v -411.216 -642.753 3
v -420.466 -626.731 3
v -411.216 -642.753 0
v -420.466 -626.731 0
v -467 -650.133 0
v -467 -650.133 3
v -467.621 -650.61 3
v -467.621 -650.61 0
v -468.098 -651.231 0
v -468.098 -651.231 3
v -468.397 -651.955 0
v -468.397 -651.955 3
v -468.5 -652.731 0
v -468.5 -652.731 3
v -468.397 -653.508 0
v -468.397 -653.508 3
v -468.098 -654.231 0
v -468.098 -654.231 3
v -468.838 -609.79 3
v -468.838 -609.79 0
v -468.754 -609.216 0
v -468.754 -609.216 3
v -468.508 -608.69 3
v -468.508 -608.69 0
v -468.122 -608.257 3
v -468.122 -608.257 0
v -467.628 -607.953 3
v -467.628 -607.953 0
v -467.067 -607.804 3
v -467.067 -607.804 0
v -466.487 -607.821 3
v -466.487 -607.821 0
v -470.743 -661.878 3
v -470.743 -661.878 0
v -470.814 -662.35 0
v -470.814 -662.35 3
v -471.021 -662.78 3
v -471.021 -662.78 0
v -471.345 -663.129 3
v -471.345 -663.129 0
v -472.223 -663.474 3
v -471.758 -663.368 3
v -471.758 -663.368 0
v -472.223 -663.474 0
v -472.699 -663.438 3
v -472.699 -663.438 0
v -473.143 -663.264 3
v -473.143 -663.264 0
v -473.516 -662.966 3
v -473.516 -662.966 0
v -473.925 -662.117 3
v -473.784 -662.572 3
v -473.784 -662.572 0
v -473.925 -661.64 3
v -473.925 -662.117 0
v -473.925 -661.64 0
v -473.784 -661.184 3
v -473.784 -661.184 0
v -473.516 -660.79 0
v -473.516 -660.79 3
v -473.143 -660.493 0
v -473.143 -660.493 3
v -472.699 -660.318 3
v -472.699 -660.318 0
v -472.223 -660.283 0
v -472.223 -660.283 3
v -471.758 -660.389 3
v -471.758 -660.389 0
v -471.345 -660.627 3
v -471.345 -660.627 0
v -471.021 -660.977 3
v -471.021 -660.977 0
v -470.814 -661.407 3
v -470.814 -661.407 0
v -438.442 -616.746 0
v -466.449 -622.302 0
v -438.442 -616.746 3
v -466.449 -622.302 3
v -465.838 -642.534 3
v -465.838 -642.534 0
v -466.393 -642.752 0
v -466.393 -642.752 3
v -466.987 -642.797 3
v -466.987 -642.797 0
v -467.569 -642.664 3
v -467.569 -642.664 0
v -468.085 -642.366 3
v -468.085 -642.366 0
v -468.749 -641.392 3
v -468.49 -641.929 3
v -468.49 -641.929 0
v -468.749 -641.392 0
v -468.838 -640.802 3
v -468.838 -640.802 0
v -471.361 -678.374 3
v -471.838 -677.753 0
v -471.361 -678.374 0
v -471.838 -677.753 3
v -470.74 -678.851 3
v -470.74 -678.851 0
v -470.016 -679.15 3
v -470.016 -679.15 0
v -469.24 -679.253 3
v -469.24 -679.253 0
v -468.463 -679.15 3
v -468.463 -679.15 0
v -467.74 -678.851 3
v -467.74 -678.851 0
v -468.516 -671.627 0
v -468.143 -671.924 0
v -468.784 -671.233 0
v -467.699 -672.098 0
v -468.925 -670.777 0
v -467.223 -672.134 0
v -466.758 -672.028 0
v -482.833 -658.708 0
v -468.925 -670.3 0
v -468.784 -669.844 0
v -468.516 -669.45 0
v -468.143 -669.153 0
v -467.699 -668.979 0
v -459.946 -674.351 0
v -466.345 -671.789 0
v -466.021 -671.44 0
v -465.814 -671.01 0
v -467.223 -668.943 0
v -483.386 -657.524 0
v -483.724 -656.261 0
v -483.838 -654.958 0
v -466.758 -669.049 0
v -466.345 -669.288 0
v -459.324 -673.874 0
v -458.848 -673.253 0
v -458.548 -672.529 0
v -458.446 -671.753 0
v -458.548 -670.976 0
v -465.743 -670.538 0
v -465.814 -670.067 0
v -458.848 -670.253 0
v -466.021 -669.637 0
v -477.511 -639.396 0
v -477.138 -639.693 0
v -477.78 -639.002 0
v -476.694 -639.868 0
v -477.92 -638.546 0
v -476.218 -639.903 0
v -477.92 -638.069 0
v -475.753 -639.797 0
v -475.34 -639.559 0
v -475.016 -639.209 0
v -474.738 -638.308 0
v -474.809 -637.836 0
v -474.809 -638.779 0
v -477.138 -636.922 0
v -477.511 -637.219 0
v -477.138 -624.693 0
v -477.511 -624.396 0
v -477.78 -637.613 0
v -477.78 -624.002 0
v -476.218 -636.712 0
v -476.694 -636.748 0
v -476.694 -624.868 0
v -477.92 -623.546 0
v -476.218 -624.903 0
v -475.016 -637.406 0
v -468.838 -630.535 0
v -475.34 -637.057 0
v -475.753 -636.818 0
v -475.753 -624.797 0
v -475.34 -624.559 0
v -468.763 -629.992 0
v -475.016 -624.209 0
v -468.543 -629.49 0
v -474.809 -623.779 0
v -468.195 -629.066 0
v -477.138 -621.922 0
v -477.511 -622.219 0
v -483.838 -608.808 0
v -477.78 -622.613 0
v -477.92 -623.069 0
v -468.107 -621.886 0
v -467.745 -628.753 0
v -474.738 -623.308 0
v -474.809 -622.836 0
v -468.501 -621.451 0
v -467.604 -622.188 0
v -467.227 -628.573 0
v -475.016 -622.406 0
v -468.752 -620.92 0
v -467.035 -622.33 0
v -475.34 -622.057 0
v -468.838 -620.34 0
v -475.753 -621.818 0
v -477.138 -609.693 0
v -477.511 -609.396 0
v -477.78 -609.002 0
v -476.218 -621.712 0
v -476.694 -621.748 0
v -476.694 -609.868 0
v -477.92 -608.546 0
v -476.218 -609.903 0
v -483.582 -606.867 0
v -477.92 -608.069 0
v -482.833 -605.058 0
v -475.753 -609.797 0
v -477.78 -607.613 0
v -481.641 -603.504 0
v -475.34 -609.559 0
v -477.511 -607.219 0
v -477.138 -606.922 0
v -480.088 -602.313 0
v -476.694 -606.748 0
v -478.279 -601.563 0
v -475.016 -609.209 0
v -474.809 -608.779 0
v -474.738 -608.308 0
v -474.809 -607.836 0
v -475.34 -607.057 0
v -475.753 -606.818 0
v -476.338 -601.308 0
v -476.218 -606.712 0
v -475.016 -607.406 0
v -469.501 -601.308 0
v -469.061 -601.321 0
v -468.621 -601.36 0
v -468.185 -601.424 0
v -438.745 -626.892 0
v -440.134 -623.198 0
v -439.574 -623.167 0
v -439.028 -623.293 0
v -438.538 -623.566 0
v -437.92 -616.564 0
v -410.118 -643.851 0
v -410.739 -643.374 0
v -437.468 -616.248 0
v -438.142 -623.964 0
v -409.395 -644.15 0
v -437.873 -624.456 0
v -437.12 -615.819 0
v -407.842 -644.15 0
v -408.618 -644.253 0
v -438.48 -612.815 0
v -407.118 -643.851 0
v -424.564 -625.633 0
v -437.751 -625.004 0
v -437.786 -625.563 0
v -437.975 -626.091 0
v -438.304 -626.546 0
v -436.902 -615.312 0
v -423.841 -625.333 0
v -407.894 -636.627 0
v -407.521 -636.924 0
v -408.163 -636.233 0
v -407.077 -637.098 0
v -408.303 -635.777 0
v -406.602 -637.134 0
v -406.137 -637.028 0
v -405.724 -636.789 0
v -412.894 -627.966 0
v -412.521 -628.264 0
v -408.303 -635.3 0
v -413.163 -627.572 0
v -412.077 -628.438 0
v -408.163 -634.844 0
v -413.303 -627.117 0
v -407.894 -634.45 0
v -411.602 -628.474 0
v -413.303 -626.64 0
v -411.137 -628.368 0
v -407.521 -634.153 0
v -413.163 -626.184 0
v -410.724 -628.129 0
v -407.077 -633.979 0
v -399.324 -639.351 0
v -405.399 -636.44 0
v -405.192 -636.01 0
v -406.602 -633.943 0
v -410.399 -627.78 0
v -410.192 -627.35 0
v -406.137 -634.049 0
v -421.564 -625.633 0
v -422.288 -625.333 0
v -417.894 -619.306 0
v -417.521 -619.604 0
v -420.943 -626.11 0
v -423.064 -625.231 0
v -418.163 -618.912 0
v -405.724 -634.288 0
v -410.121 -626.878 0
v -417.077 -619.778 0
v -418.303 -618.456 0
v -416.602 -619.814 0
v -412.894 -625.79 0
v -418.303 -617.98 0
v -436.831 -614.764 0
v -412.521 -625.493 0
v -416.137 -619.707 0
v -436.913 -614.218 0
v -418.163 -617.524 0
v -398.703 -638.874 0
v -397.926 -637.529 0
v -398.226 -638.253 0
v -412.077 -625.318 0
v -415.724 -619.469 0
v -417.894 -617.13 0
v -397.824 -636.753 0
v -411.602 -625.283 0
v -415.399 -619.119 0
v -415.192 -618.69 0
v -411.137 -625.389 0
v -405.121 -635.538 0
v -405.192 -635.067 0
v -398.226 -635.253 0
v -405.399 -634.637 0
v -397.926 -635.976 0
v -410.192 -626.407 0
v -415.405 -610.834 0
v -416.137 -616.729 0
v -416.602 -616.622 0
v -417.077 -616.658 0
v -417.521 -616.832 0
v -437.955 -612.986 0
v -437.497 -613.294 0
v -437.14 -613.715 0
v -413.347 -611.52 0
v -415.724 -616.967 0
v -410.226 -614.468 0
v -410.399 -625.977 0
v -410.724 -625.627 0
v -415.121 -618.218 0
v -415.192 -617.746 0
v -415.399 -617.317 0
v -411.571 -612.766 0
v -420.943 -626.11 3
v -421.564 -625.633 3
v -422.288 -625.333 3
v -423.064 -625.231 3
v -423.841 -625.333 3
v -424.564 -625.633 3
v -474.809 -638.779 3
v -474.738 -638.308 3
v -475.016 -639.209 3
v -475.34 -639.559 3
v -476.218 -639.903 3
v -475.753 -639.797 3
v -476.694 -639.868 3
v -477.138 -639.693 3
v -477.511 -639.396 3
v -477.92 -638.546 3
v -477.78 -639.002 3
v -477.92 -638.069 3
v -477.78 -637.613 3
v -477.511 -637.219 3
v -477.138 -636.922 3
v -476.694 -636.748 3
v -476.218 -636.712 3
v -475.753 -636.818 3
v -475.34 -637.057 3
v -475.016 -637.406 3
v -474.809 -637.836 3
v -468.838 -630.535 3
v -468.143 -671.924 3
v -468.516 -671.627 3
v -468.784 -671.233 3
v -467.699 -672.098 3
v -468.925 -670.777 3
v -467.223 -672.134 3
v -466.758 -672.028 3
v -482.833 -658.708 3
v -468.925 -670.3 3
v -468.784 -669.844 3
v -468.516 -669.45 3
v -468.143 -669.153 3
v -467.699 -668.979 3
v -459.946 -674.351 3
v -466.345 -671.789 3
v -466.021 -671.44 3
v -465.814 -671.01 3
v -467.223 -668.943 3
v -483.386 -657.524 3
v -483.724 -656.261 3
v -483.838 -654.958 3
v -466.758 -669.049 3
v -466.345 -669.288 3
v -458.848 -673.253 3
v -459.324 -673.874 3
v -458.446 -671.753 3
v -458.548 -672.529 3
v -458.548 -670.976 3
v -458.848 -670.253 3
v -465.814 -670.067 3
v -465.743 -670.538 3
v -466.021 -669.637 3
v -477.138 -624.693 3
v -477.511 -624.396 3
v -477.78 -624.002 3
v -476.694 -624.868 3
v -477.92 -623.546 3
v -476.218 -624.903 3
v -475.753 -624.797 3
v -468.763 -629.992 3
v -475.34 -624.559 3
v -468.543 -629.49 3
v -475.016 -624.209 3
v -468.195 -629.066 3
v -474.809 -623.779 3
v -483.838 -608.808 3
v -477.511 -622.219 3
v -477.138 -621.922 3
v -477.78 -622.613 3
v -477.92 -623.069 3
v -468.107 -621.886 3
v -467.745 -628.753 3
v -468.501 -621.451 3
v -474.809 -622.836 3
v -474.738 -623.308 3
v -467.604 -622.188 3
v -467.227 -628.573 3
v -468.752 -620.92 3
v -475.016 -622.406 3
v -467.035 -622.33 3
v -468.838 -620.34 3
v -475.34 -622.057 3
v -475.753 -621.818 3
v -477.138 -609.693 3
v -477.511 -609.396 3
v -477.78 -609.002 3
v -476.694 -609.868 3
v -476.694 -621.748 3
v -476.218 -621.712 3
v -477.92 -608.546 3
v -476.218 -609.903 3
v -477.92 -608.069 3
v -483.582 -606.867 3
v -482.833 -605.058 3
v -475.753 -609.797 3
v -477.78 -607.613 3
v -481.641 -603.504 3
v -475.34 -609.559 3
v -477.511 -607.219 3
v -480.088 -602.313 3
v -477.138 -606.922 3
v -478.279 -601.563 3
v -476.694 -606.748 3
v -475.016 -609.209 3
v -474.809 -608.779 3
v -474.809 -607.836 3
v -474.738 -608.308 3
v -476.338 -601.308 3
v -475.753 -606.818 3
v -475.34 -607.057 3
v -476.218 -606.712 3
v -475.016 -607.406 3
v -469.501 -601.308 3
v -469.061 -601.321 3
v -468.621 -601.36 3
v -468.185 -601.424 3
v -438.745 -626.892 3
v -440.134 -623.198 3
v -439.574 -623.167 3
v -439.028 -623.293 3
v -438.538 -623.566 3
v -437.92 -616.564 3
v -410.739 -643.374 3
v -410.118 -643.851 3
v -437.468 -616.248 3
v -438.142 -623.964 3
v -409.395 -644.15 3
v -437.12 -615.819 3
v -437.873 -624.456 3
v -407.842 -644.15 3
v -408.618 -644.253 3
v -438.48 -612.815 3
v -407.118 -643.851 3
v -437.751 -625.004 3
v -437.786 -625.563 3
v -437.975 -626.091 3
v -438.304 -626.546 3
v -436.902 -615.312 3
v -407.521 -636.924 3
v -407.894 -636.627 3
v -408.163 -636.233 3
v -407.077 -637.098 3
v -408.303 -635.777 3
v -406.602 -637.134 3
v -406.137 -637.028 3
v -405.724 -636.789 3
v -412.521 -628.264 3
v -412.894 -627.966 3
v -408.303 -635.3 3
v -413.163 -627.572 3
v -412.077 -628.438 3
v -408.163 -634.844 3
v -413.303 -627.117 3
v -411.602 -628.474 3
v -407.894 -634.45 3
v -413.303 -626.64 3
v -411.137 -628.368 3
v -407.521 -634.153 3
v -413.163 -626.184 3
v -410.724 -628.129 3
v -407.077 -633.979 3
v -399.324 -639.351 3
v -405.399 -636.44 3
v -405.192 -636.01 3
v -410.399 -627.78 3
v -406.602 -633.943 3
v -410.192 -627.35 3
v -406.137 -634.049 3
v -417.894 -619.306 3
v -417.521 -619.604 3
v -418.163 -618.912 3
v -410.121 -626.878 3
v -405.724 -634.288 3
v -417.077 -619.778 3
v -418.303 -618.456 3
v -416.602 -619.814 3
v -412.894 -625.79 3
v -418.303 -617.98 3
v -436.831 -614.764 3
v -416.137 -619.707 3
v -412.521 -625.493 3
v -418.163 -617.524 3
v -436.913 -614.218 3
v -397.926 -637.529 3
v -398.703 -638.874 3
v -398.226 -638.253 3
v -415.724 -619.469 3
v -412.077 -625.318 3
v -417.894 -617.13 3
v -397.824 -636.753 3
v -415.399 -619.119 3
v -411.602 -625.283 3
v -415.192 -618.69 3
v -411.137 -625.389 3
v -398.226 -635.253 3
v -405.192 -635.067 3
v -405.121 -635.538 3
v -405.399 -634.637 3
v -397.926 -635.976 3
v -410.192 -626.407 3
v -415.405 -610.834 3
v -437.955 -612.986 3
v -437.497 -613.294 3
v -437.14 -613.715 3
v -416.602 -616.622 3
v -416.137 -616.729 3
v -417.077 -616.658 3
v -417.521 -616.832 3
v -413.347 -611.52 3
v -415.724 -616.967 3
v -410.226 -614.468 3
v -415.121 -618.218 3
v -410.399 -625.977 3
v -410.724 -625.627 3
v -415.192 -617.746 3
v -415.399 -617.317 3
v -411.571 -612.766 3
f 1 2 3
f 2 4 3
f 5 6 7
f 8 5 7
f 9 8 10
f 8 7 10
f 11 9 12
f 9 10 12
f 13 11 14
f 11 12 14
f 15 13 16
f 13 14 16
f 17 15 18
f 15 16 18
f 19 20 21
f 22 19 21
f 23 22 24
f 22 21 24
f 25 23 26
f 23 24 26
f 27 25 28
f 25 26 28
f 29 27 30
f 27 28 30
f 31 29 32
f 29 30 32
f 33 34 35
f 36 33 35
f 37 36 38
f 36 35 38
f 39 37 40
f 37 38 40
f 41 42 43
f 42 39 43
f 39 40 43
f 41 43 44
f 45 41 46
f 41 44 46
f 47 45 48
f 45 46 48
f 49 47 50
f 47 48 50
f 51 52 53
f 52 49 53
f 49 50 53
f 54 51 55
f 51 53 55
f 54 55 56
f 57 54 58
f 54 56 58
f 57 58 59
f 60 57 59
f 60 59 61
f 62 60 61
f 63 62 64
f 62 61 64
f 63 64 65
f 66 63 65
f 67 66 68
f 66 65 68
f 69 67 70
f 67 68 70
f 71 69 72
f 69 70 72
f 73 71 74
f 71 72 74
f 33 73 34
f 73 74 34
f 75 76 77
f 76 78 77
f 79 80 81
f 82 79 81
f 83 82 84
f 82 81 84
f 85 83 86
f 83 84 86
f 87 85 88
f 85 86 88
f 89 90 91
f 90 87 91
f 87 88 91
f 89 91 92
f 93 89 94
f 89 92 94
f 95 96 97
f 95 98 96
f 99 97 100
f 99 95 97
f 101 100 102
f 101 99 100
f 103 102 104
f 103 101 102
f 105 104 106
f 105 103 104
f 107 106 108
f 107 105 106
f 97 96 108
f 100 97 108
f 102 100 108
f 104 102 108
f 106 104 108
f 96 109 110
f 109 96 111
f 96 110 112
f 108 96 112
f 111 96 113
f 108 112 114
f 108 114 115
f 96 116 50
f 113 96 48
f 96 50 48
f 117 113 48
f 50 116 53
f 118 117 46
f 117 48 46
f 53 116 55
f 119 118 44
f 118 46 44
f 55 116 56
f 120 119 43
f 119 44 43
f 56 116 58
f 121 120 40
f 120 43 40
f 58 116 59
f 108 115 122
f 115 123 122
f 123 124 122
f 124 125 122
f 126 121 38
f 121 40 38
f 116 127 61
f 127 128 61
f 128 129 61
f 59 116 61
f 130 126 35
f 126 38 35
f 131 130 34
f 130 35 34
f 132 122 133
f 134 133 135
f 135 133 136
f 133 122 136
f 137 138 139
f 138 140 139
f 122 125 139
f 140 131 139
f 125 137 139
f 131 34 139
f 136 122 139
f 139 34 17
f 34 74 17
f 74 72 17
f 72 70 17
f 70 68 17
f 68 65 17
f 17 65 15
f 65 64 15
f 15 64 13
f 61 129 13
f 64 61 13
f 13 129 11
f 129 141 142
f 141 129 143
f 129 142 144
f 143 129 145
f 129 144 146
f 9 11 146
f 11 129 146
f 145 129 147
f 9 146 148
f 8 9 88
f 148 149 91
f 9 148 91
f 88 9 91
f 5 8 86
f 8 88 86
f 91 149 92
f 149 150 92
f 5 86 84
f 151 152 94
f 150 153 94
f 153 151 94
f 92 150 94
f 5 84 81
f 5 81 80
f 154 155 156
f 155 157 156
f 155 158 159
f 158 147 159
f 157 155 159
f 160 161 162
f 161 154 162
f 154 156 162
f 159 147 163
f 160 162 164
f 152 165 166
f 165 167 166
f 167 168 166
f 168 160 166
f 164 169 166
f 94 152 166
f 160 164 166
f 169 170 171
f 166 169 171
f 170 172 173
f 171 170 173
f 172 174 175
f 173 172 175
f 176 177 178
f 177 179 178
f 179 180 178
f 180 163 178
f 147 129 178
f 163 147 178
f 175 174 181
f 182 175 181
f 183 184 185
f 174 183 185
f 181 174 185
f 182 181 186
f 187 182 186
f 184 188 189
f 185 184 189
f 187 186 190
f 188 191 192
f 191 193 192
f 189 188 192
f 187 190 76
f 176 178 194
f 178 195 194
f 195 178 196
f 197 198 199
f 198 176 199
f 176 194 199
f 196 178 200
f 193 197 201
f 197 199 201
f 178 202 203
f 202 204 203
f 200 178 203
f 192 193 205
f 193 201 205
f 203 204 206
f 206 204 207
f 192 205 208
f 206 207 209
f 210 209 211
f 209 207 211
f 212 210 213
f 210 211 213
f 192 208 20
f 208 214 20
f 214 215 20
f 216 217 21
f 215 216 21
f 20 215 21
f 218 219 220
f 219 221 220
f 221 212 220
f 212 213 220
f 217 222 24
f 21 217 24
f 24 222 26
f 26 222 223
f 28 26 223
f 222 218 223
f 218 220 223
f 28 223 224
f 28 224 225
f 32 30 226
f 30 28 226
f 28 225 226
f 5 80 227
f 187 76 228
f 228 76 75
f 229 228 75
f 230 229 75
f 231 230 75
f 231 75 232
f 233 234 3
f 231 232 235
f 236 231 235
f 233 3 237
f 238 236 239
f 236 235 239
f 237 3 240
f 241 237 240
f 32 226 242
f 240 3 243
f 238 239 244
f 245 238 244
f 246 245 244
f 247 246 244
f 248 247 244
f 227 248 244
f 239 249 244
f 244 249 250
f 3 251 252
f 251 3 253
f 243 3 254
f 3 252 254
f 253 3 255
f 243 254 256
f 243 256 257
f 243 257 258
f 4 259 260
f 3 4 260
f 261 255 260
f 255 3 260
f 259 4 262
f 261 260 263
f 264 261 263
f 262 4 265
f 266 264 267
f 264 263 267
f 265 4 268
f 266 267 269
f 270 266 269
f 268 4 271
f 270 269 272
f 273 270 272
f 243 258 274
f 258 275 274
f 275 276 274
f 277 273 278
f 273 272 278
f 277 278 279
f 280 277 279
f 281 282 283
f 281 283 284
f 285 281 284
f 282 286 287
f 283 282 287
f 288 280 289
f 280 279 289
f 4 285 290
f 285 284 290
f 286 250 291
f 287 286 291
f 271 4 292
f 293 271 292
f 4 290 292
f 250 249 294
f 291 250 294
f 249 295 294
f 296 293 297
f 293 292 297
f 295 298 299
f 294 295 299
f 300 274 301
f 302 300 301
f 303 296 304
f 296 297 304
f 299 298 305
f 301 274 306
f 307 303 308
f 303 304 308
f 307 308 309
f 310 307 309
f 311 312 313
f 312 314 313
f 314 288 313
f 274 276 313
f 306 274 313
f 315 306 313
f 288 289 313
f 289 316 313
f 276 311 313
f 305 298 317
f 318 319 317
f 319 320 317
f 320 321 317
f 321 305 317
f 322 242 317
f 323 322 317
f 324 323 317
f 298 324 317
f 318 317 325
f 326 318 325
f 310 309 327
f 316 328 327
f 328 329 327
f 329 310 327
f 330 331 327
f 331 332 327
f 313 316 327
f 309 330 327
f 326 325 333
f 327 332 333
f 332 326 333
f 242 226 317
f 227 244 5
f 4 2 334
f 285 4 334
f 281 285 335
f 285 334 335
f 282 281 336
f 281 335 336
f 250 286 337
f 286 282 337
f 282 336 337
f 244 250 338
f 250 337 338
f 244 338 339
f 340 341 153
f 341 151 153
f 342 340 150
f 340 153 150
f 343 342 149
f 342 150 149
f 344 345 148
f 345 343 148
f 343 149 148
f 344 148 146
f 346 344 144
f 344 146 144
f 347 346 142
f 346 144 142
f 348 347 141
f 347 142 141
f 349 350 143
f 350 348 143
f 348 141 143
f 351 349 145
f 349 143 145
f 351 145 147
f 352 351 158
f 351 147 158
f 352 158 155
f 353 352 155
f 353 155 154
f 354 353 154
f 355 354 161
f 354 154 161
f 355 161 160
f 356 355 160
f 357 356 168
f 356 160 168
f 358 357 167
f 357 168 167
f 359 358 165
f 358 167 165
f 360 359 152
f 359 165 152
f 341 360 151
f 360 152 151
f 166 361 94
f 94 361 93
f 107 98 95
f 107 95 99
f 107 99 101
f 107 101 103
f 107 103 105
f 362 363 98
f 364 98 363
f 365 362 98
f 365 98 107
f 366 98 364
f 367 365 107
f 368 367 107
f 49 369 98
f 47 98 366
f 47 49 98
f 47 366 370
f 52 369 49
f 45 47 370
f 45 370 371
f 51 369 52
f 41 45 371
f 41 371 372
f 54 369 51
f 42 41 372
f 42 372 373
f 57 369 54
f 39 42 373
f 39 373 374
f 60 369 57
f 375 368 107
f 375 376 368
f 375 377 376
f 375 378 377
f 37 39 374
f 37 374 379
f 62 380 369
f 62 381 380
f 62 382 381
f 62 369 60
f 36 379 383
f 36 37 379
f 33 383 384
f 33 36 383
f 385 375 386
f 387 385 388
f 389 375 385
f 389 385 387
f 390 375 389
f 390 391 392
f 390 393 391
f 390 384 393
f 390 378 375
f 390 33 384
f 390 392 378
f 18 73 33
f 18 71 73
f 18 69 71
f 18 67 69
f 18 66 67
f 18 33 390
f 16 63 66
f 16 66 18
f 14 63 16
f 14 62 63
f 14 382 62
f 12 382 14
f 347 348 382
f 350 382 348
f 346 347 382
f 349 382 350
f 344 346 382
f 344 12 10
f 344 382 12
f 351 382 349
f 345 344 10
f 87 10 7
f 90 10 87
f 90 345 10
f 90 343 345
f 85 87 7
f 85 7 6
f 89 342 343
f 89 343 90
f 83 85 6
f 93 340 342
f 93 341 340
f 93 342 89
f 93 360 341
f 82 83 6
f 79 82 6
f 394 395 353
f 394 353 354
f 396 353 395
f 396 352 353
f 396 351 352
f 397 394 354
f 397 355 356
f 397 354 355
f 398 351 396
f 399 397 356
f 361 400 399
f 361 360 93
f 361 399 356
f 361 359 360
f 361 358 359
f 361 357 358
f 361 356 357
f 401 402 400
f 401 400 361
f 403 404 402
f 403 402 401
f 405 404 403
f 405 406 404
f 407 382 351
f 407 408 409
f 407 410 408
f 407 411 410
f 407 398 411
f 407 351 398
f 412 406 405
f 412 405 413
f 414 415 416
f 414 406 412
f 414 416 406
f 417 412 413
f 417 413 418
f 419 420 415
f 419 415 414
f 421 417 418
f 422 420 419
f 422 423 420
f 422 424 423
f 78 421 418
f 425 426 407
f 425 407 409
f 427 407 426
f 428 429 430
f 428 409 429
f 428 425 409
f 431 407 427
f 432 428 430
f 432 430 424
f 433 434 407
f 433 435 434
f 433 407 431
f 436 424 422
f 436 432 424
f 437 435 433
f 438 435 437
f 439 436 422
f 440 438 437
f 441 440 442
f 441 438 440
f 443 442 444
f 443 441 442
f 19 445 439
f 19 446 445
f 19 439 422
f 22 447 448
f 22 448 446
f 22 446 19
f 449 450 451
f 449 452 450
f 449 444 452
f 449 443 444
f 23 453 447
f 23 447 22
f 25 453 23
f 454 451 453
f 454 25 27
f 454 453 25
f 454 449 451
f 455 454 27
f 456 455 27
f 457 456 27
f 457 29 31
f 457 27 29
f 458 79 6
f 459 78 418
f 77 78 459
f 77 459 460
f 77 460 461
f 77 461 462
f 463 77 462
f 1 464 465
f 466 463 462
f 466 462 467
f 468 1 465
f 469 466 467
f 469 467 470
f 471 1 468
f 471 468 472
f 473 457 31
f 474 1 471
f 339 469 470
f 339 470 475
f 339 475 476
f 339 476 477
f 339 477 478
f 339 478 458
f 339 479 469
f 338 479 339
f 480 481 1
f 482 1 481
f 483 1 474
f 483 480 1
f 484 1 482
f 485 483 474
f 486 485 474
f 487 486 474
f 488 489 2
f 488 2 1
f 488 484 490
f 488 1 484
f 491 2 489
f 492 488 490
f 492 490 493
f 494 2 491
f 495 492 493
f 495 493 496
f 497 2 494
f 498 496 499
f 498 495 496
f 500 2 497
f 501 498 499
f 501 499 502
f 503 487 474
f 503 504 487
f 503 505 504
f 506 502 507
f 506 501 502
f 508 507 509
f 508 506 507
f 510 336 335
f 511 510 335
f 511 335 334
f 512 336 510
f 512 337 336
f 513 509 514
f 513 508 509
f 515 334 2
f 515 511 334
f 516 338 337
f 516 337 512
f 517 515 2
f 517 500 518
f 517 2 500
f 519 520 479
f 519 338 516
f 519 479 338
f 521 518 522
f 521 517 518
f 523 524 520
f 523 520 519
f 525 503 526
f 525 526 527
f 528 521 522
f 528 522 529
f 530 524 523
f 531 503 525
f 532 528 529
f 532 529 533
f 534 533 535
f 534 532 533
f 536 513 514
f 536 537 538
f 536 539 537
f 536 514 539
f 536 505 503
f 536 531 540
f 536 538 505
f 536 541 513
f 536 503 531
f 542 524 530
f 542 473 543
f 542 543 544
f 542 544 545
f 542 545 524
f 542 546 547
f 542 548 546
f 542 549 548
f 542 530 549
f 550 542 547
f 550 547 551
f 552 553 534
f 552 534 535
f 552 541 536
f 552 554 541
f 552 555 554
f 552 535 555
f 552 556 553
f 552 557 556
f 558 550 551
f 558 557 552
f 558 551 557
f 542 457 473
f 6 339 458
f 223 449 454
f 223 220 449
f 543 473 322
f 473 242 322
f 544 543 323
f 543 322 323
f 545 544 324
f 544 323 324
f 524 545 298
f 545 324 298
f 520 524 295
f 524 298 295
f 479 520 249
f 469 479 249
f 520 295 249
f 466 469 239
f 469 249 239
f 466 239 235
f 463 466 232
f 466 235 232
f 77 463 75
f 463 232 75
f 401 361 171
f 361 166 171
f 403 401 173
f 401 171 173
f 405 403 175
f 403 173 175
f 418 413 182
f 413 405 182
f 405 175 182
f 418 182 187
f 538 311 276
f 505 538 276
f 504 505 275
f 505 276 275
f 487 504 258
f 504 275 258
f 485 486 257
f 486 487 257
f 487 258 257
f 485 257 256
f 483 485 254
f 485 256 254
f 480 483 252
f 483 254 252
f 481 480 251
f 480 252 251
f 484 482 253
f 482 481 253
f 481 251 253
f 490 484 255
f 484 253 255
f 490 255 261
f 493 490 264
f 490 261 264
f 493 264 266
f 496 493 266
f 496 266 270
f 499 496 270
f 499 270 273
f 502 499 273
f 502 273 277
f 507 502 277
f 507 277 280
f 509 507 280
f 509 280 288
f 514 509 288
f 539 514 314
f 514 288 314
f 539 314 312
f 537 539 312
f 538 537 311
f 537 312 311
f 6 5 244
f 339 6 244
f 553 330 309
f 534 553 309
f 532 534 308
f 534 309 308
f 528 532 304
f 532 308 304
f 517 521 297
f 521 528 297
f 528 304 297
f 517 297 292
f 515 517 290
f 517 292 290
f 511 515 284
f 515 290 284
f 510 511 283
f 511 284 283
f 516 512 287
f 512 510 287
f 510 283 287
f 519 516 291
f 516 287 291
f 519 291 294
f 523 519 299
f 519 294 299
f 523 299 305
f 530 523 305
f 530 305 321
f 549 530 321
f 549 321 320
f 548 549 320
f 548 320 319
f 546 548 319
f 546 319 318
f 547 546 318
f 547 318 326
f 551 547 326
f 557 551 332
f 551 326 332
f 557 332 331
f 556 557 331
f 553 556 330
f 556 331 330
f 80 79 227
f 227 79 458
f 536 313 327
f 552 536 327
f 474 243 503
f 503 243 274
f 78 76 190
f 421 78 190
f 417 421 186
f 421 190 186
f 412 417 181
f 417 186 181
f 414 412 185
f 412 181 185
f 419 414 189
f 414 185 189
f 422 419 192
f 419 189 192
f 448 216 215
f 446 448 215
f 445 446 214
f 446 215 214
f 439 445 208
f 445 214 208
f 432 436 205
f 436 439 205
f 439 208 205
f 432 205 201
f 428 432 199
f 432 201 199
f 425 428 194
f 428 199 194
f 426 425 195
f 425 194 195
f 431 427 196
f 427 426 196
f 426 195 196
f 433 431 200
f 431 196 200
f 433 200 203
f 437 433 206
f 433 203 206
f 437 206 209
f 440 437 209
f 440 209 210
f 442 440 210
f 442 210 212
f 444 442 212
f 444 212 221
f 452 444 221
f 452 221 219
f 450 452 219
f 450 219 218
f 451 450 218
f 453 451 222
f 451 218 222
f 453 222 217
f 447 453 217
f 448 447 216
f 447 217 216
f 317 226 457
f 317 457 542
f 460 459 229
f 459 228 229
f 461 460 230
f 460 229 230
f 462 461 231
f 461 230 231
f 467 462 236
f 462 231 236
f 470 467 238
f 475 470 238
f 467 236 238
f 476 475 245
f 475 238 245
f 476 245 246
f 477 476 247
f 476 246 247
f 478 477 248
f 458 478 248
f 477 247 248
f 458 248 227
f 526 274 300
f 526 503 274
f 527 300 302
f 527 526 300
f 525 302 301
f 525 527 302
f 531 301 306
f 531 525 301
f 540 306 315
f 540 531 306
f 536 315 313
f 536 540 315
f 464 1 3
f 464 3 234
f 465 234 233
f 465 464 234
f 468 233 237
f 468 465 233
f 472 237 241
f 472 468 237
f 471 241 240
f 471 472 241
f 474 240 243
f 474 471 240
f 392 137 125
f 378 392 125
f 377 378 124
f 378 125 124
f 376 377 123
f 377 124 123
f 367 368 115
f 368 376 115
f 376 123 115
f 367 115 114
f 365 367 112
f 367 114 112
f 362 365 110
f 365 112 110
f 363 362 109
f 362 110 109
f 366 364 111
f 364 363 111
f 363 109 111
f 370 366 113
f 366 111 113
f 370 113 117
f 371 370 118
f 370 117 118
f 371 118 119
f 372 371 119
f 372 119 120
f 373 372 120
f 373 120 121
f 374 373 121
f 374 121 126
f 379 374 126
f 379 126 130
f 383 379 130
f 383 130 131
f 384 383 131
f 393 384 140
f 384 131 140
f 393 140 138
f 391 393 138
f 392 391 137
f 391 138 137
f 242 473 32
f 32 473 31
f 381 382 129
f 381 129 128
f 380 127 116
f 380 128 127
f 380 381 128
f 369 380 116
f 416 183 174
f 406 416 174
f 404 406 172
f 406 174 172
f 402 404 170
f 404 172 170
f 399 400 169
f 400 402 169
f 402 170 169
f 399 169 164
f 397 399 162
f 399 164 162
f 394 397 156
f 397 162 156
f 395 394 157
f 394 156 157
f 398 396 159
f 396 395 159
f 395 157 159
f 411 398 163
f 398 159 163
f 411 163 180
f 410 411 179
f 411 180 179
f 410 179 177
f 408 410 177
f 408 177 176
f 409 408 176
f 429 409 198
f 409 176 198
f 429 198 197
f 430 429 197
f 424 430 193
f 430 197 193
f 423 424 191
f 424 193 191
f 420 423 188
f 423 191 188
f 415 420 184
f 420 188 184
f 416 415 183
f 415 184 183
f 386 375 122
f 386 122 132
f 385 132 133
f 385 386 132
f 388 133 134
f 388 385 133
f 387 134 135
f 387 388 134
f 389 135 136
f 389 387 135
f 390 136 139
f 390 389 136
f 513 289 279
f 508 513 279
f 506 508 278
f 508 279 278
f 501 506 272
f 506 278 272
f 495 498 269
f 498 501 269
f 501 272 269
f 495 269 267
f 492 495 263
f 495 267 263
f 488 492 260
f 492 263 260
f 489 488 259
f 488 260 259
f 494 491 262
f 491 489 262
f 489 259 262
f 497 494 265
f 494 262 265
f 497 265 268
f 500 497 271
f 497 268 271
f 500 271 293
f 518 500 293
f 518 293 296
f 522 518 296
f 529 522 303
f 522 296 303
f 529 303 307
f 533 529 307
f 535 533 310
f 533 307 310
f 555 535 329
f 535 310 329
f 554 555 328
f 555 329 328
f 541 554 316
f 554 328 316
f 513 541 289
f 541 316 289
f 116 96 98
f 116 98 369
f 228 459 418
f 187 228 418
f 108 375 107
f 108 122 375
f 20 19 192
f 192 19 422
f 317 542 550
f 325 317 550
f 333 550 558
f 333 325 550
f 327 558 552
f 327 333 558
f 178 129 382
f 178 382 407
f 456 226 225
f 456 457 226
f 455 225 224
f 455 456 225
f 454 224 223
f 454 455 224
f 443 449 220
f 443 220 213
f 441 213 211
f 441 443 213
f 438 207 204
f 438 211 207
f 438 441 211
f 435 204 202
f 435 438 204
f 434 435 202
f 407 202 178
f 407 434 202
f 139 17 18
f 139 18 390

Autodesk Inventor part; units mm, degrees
ref_plane "YZ Plane" through (0, 0, 0) normal (1, 0, 0) x (0, 1, 0)
ref_plane "XZ Plane" through (0, 0, 0) normal (0, 1, 0) x (-1, 0, 0)
ref_plane "XY Plane" through (0, 0, 0) normal (0, 0, 1) x (1, 0, 0)
sketch "スケッチ1" plane through (0, 0, 0) normal (0, 0, 1) x (1, 0, 0)
  line L0 (67.5, 17.5) -> (-67.5, 17.5) construction
  line L1 (-67.5, 17.5) -> (-67.5, -17.5) construction
  line L2 (-67.5, -17.5) -> (67.5, -17.5) construction
  line L3 (67.5, -17.5) -> (67.5, 17.5) construction
  line L4 (67.5, 17.5) -> (-67.5, -17.5) construction
  line L5 (-67.5, 17.5) -> (67.5, -17.5) construction
  circle A0 centre (-60, 35) radius 1.6 construction
  circle A1 centre (-70, 35) radius 1.6 construction
  line L6 (-77.5, 27.5) -> (-53, 27.5) construction
  line L7 (-53, 27.5) -> (-53, 42.5) construction
  line L8 (-53, 42.5) -> (-80, 42.5) construction
  line L9 (-77.5, 27.5) -> (-77.5, -27.5) construction
  line L10 (-77.5, -27.5) -> (-53, -27.5) construction
  line L11 (-53, -27.5) -> (-53, -42.5) construction
  line L12 (-53, -42.5) -> (-80, -42.5) construction
  circle A2 centre (-60, -35) radius 1.6 construction
  circle A3 centre (-70, -35) radius 1.6 construction
  circle A4 centre (-80, -35) radius 1.6 construction
  line L13 (124.2308, -31.7536) -> (484.5935, -392.1164)
  line L14 (484.5935, -392.1164) -> (488.7129, -553.575)
  line L15 (-80, 21.2868) -> (-468.838, -367.5512) construction
  line L16 (-468.838, -367.5512) -> (-479.4446, -356.9446)
  line L17 (-479.4446, -356.9446) -> (-90.6066, 31.8934) construction
  line L18 (-90.6066, 31.8934) -> (-80, 21.2868) construction
  line L19 (-80, 42.5) -> (-80, 5.3052) construction
  circle A5 centre (-92.3744, 19.519) radius 1.6 construction
  circle A6 centre (-102.981, 8.9124) radius 1.6 construction
  circle A7 centre (-113.5876, -1.6942) radius 1.6 construction
  line L20 (-92.3744, 19.519) -> (-113.5876, -1.6942) construction
  circle A8 centre (-437.941, -345.2067) radius 1.6
  circle A9 centre (-426.1402, -333.4059) radius 1.6
  line L21 (-388.4374, -772.2067) -> (-358.1265, -754.7067) construction
  line L22 (-358.1265, -754.7067) -> (-425.6265, -637.7933) construction
  line L23 (-455.9374, -655.2933) -> (-358.1265, -754.7067) construction
  line L24 (-388.4374, -772.2067) -> (-425.6265, -637.7933) construction
  line L25 (-455.9374, -655.2933) -> (-388.4374, -772.2067) construction
  line L26 (-425.6265, -637.7933) -> (-455.9374, -655.2933) construction
  line L27 (455.9374, -655.2933) -> (425.6265, -637.7933) construction
  line L28 (425.6265, -637.7933) -> (358.1265, -754.7067) construction
  line L29 (388.4374, -772.2067) -> (425.6265, -637.7933) construction
  line L30 (455.9374, -655.2933) -> (358.1265, -754.7067) construction
  line L31 (388.4374, -772.2067) -> (455.9374, -655.2933) construction
  line L32 (358.1265, -754.7067) -> (388.4374, -772.2067) construction
  line L33 (0, 0) -> (0, -263.4473) construction
  circle A10 centre (80, -35) radius 1.6 construction
  line L34 (67.5, 17.5) -> (67.5, -17.5) construction
  line L35 (77.5, 27.5) -> (53, 27.5) construction
  line L36 (77.5, 27.5) -> (77.5, -27.5) construction
  line L37 (77.5, -27.5) -> (53, -27.5) construction
  circle A11 centre (60, -35) radius 1.6 construction
  circle A12 centre (70, -35) radius 1.6 construction
  line L38 (53, -27.5) -> (53, -42.5) construction
  line L39 (53, -42.5) -> (80, -42.5) construction
  circle A13 centre (60, 35) radius 1.6 construction
  circle A14 centre (70, 35) radius 1.6 construction
  line L40 (80, 42.5) -> (80, 5.3052) construction
  line L41 (53, 42.5) -> (80, 42.5) construction
  line L42 (53, 27.5) -> (53, 42.5) construction
  line L43 (-392.0976, -785.867) -> (-404.3476, -764.6493)
  line L44 (-388.4374, -772.2067) -> (-358.1265, -754.7067) construction
  line L45 (-392.0976, -785.867) -> (-344.4662, -758.367)
  circle A15 centre (-336.7211, -756.782) radius 1.6
  circle A16 centre (-341.7211, -748.1218) radius 1.6
  line L46 (-343.7259, -729.6493) -> (-330.2259, -753.032)
  circle A17 centre (-346.7211, -739.4615) radius 1.6
  line L47 (-356.7162, -737.1493) -> (-343.7259, -729.6493)
  line L48 (-344.4662, -758.367) -> (-356.7162, -737.1493)
  circle A18 centre (-407.3428, -774.4615) radius 1.6
  circle A19 centre (-402.3428, -783.1218) radius 1.6
  line L49 (-404.3476, -764.6493) -> (-417.338, -772.1493)
  line L50 (-417.338, -772.1493) -> (-403.838, -795.532)
  line L51 (-403.838, -795.532) -> (-371.6264, -776.9346) construction
  line L52 (-425.6265, -637.7933) -> (-455.9374, -655.2933) construction
  line L53 (-409.7162, -645.3507) -> (-396.7259, -637.8507)
  circle A20 centre (-406.7211, -635.5385) radius 1.6
  line L54 (-455.9374, -655.2933) -> (-425.6265, -637.7933) construction
  circle A21 centre (-411.7211, -626.8782) radius 1.6
  line L55 (-469.5976, -651.633) -> (-421.9662, -624.133)
  line L56 (-421.9662, -624.133) -> (-409.7162, -645.3507)
  line L57 (-396.7259, -637.8507) -> (-410.2259, -614.468)
  circle A22 centre (-416.7211, -618.218) radius 1.6
  line L58 (-469.5976, -651.633) -> (-457.3476, -672.8507)
  circle A23 centre (-467.3428, -670.5385) radius 1.6
  circle A24 centre (-472.3428, -661.8782) radius 1.6
  line L59 (-483.838, -656.968) -> (-451.6264, -638.3706) construction
  line L60 (-470.338, -680.3507) -> (-483.838, -656.968)
  line L61 (-457.3476, -672.8507) -> (-470.338, -680.3507)
  line L62 (469.5976, -651.633) -> (457.3476, -672.8507)
  line L63 (455.9374, -655.2933) -> (425.6265, -637.7933) construction
  line L64 (469.5976, -651.633) -> (421.9662, -624.133)
  circle A25 centre (416.7211, -618.218) radius 1.6
  circle A26 centre (411.7211, -626.8782) radius 1.6
  line L65 (396.7259, -637.8507) -> (410.2259, -614.468)
  circle A27 centre (406.7211, -635.5385) radius 1.6
  line L66 (409.7162, -645.3507) -> (396.7259, -637.8507)
  line L67 (421.9662, -624.133) -> (409.7162, -645.3507)
  circle A28 centre (467.3428, -670.5385) radius 1.6
  circle A29 centre (472.3428, -661.8782) radius 1.6
  line L68 (457.3476, -672.8507) -> (470.338, -680.3507)
  line L69 (470.338, -680.3507) -> (483.838, -656.968)
  line L70 (483.838, -656.968) -> (451.6264, -638.3706) construction
  line L71 (358.1265, -754.7067) -> (388.4374, -772.2067) construction
  line L72 (356.7162, -737.1493) -> (343.7259, -729.6493)
  circle A30 centre (346.7211, -739.4615) radius 1.6
  line L73 (388.4374, -772.2067) -> (358.1265, -754.7067) construction
  circle A31 centre (341.7211, -748.1218) radius 1.6
  line L74 (392.0976, -785.867) -> (344.4662, -758.367)
  line L75 (344.4662, -758.367) -> (356.7162, -737.1493)
  line L76 (343.7259, -729.6493) -> (330.2259, -753.032)
  circle A32 centre (336.7211, -756.782) radius 1.6
  line L77 (392.0976, -785.867) -> (404.3476, -764.6493)
  circle A33 centre (407.3428, -774.4615) radius 1.6
  circle A34 centre (402.3428, -783.1218) radius 1.6
  line L78 (403.838, -795.532) -> (371.6264, -776.9346) construction
  line L79 (417.338, -772.1493) -> (403.838, -795.532)
  line L80 (404.3476, -764.6493) -> (417.338, -772.1493)
  line L81 (-483.838, -367.5512) -> (-468.838, -367.5512)
  line L82 (-468.838, -367.5512) -> (-468.838, -648.3077) construction
  line L83 (-468.838, -648.3077) -> (-483.838, -648.3077) construction
  line L84 (-483.838, -648.3077) -> (-483.838, -367.5512) construction
  line L85 (-283.2277, -604.4352) -> (-262.2277, -640.8083) construction
  line L86 (345.2492, -497.0108) -> (305.7786, -565.3759) construction
  line L87 (260.9224, -655.004) -> (-239.0776, -655.004) construction
  line L88 (-239.0776, -655.004) -> (-239.0776, -1155.004) construction
  line L89 (-239.0776, -1155.004) -> (260.9224, -1155.004) construction
  line L90 (260.9224, -1155.004) -> (260.9224, -655.004) construction
  line L91 (260.9224, -655.004) -> (-239.0776, -1155.004) construction
  line L92 (-239.0776, -655.004) -> (260.9224, -1155.004) construction
  line L93 (-12.841, -157.5) -> (15.1134, -157.5) construction
  circle A35 centre (-3.0548, -432.807) radius 212.5 construction
  line L94 (496.9452, 30.2659) -> (-503.0548, 30.2659) construction
  line L95 (-503.0548, 30.2659) -> (-503.0548, -969.7341) construction
  line L96 (-503.0548, -969.7341) -> (496.9452, -969.7341) construction
  line L97 (496.9452, -969.7341) -> (496.9452, 30.2659) construction
  line L98 (496.9452, 30.2659) -> (-503.0548, -969.7341) construction
  line L99 (-503.0548, 30.2659) -> (496.9452, -969.7341) construction
  circle A36 centre (-3.0548, -432.807) radius 250 construction
  line L100 (-80, 42.5) -> (-90.6066, 31.8934) construction
  line L101 (-80, 42.5) -> (-118.8909, 3.6091) construction
  line L102 (-118.8909, -6.2904) -> (-113.234, -11.9472) construction
  line L103 (-113.234, -11.9472) -> (-85.3433, -40.263) construction
  arc A37 (-118.8909, 3.6091) -> (-118.8909, -6.2904) centre (-113.9411, -1.3406) ccw construction
  arc A38 (-85.3433, -40.263) -> (-80, -42.5) centre (-80, -35) ccw construction
  line L104 (-80, 42.5) -> (-53, 42.5) construction
  circle A39 centre (-476.338, -638.3077) radius 1.6
  circle A40 centre (-476.338, -623.3077) radius 1.6
  circle A41 centre (-476.338, -608.3077) radius 1.6
  line L105 (-483.838, -656.968) -> (-483.838, -601.3077)
  line L106 (-483.838, -601.3077) -> (-468.838, -601.3077)
  line L107 (-468.838, -601.3077) -> (-415.4046, -610.8344)
  arc A42 (-410.2259, -614.468) -> (-415.4046, -610.8344) centre (-416.7211, -618.218) ccw
  point P0 (0, -470)
  point P1 (-102.981, 8.9124)
  point P2 (-77.5, 0)
  point P3 (-407.0319, -705)
  point P4 (-407.0319, -705)
  point P5 (407.0319, -705)
  point P6 (407.0319, -705)
  point P7 (77.5, 0)
  point P8 (-368.2819, -772.117)
  point P9 (-385.4668, -784.9254)
  point P10 (-445.7819, -637.883)
  point P11 (445.7819, -637.883)
  point P12 (465.4668, -646.3614)
  point P13 (368.2819, -772.117)
  point P14 (10.9224, -905.004)
  point P15 (-3.0548, -469.7341)
  point P16 (-123.8406, -1.3406)
  dimension "d4" = 135
  dimension "d5" = 35
  dimension "d6" = 3.2
  dimension "d7" = 3.2
  dimension "d8" = 10
  dimension "d9" = 15
  dimension "d10" = 10
  dimension "d11" = 7.5
  dimension "d12" = 7
  dimension "d13" = 70
  dimension "d14" = 3.2
  dimension "d15" = 3.2
  dimension "d16" = 3.2
  dimension "d17" = 10
  dimension "d18" = 10
  dimension "d19" = 7
  dimension "d20" = 15
  dimension "d21" = 7.5
  dimension "d22" = 10
  dimension "d23" = 10
  dimension "d24" = 135
  dimension "d25" = 15
  dimension "d26" = 10
  dimension "d27" = 3.2
  dimension "d28" = 3.2
  dimension "d29" = 3.2
  dimension "d30" = 10
  dimension "d31" = 15
  dimension "d32" = 15
  dimension "d33" = 7.5
  dimension "d34" = 45
  dimension "d35" = 3.2
  dimension "d36" = 3.2
  dimension "d37" = 360
  dimension "d38" = 360
  dimension "d39" = 470
  dimension "d40" = 15
  dimension "d41" = 200
  dimension "d42" = 200
  dimension "d43" = 500
  dimension "d44" = 500
  dimension "d45" = 200
  dimension "d46" = 425
  dimension "d47" = 1000
  dimension "d48" = 1000
  dimension "d49" = 42
  dimension "d50" = 500
  dimension "d51" = 7
  dimension "d52" = 7
  dimension "d53" = 3.2
  dimension "d54" = 3.2
  dimension "d55" = 3.2
  dimension "d56" = 15
  dimension "d57" = 15
  dimension "d58" = 7.5
  dimension "d59" = 10
  dimension "d60" = 7
extrude "押し出し1" add sketch "スケッチ1" along normal blind 3 contours L56 L55 L58 L61 L60 L105 L106 L107 A42 L57 L53
fillet "フィレット1" radius 7.5 3 edges at (-483.838, -601.3077, 1.5) (-468.838, -601.3077, 1.5) (-483.838, -656.968, 1.5)
fillet "フィレット2" radius 3 6 edges at (-470.338, -680.3507, 1.5) (-457.3476, -672.8507, 1.5) (-469.5976, -651.633, 1.5) (-421.9662, -624.133, 1.5) (-409.7162, -645.3507, 1.5) (-396.7259, -637.8507, 1.5)
sketch "スケッチ2" plane through (0, 0, 3) normal (0, 0, 1) x (1, 0, 0)
  line L0 (-468.838, -607.4023) -> (-468.838, -622.7758)
  line L1 (-468.838, -622.7758) -> (-428.0246, -614.679)
  line L2 (-428.0246, -614.679) -> (-468.838, -607.4023)
  line L3 (-468.838, -628.8928) -> (-468.838, -644.2663)
  line L4 (-468.838, -644.2663) -> (-428.2708, -620.8447)
  line L5 (-428.2708, -620.8447) -> (-468.838, -628.8928)
  line L6 (-415.4046, -610.8344) -> (-468.185, -601.4241) projected
  line L7 (-466.9996, -650.133) -> (-424.5643, -625.633) projected
  line L8 (-483.838, -608.8077) -> (-483.838, -654.9583) projected
  circle A0 centre (-416.7211, -618.218) radius 1.6 construction
  line L9 (-428.0246, -614.679) -> (-416.7211, -618.218) construction
  line L10 (-416.7211, -618.218) -> (-428.2708, -620.8447) construction
  point P0 (0, 0)
  dimension "d65" = 15
  dimension "d66" = 6
  dimension "d67" = 6
  dimension "d68" = 6
extrude "押し出し2" cut sketch "スケッチ2" against normal blind 10
fillet "フィレット3" radius 2 6 edges at (-468.838, -607.4023, 1.5) (-468.838, -622.7758, 1.5) (-428.0246, -614.679, 1.5) (-428.2708, -620.8447, 1.5) (-468.838, -628.8928, 1.5) (-468.838, -644.2663, 1.5)
properties part number "オムニ_前1" material "アルミニウム 6061"
